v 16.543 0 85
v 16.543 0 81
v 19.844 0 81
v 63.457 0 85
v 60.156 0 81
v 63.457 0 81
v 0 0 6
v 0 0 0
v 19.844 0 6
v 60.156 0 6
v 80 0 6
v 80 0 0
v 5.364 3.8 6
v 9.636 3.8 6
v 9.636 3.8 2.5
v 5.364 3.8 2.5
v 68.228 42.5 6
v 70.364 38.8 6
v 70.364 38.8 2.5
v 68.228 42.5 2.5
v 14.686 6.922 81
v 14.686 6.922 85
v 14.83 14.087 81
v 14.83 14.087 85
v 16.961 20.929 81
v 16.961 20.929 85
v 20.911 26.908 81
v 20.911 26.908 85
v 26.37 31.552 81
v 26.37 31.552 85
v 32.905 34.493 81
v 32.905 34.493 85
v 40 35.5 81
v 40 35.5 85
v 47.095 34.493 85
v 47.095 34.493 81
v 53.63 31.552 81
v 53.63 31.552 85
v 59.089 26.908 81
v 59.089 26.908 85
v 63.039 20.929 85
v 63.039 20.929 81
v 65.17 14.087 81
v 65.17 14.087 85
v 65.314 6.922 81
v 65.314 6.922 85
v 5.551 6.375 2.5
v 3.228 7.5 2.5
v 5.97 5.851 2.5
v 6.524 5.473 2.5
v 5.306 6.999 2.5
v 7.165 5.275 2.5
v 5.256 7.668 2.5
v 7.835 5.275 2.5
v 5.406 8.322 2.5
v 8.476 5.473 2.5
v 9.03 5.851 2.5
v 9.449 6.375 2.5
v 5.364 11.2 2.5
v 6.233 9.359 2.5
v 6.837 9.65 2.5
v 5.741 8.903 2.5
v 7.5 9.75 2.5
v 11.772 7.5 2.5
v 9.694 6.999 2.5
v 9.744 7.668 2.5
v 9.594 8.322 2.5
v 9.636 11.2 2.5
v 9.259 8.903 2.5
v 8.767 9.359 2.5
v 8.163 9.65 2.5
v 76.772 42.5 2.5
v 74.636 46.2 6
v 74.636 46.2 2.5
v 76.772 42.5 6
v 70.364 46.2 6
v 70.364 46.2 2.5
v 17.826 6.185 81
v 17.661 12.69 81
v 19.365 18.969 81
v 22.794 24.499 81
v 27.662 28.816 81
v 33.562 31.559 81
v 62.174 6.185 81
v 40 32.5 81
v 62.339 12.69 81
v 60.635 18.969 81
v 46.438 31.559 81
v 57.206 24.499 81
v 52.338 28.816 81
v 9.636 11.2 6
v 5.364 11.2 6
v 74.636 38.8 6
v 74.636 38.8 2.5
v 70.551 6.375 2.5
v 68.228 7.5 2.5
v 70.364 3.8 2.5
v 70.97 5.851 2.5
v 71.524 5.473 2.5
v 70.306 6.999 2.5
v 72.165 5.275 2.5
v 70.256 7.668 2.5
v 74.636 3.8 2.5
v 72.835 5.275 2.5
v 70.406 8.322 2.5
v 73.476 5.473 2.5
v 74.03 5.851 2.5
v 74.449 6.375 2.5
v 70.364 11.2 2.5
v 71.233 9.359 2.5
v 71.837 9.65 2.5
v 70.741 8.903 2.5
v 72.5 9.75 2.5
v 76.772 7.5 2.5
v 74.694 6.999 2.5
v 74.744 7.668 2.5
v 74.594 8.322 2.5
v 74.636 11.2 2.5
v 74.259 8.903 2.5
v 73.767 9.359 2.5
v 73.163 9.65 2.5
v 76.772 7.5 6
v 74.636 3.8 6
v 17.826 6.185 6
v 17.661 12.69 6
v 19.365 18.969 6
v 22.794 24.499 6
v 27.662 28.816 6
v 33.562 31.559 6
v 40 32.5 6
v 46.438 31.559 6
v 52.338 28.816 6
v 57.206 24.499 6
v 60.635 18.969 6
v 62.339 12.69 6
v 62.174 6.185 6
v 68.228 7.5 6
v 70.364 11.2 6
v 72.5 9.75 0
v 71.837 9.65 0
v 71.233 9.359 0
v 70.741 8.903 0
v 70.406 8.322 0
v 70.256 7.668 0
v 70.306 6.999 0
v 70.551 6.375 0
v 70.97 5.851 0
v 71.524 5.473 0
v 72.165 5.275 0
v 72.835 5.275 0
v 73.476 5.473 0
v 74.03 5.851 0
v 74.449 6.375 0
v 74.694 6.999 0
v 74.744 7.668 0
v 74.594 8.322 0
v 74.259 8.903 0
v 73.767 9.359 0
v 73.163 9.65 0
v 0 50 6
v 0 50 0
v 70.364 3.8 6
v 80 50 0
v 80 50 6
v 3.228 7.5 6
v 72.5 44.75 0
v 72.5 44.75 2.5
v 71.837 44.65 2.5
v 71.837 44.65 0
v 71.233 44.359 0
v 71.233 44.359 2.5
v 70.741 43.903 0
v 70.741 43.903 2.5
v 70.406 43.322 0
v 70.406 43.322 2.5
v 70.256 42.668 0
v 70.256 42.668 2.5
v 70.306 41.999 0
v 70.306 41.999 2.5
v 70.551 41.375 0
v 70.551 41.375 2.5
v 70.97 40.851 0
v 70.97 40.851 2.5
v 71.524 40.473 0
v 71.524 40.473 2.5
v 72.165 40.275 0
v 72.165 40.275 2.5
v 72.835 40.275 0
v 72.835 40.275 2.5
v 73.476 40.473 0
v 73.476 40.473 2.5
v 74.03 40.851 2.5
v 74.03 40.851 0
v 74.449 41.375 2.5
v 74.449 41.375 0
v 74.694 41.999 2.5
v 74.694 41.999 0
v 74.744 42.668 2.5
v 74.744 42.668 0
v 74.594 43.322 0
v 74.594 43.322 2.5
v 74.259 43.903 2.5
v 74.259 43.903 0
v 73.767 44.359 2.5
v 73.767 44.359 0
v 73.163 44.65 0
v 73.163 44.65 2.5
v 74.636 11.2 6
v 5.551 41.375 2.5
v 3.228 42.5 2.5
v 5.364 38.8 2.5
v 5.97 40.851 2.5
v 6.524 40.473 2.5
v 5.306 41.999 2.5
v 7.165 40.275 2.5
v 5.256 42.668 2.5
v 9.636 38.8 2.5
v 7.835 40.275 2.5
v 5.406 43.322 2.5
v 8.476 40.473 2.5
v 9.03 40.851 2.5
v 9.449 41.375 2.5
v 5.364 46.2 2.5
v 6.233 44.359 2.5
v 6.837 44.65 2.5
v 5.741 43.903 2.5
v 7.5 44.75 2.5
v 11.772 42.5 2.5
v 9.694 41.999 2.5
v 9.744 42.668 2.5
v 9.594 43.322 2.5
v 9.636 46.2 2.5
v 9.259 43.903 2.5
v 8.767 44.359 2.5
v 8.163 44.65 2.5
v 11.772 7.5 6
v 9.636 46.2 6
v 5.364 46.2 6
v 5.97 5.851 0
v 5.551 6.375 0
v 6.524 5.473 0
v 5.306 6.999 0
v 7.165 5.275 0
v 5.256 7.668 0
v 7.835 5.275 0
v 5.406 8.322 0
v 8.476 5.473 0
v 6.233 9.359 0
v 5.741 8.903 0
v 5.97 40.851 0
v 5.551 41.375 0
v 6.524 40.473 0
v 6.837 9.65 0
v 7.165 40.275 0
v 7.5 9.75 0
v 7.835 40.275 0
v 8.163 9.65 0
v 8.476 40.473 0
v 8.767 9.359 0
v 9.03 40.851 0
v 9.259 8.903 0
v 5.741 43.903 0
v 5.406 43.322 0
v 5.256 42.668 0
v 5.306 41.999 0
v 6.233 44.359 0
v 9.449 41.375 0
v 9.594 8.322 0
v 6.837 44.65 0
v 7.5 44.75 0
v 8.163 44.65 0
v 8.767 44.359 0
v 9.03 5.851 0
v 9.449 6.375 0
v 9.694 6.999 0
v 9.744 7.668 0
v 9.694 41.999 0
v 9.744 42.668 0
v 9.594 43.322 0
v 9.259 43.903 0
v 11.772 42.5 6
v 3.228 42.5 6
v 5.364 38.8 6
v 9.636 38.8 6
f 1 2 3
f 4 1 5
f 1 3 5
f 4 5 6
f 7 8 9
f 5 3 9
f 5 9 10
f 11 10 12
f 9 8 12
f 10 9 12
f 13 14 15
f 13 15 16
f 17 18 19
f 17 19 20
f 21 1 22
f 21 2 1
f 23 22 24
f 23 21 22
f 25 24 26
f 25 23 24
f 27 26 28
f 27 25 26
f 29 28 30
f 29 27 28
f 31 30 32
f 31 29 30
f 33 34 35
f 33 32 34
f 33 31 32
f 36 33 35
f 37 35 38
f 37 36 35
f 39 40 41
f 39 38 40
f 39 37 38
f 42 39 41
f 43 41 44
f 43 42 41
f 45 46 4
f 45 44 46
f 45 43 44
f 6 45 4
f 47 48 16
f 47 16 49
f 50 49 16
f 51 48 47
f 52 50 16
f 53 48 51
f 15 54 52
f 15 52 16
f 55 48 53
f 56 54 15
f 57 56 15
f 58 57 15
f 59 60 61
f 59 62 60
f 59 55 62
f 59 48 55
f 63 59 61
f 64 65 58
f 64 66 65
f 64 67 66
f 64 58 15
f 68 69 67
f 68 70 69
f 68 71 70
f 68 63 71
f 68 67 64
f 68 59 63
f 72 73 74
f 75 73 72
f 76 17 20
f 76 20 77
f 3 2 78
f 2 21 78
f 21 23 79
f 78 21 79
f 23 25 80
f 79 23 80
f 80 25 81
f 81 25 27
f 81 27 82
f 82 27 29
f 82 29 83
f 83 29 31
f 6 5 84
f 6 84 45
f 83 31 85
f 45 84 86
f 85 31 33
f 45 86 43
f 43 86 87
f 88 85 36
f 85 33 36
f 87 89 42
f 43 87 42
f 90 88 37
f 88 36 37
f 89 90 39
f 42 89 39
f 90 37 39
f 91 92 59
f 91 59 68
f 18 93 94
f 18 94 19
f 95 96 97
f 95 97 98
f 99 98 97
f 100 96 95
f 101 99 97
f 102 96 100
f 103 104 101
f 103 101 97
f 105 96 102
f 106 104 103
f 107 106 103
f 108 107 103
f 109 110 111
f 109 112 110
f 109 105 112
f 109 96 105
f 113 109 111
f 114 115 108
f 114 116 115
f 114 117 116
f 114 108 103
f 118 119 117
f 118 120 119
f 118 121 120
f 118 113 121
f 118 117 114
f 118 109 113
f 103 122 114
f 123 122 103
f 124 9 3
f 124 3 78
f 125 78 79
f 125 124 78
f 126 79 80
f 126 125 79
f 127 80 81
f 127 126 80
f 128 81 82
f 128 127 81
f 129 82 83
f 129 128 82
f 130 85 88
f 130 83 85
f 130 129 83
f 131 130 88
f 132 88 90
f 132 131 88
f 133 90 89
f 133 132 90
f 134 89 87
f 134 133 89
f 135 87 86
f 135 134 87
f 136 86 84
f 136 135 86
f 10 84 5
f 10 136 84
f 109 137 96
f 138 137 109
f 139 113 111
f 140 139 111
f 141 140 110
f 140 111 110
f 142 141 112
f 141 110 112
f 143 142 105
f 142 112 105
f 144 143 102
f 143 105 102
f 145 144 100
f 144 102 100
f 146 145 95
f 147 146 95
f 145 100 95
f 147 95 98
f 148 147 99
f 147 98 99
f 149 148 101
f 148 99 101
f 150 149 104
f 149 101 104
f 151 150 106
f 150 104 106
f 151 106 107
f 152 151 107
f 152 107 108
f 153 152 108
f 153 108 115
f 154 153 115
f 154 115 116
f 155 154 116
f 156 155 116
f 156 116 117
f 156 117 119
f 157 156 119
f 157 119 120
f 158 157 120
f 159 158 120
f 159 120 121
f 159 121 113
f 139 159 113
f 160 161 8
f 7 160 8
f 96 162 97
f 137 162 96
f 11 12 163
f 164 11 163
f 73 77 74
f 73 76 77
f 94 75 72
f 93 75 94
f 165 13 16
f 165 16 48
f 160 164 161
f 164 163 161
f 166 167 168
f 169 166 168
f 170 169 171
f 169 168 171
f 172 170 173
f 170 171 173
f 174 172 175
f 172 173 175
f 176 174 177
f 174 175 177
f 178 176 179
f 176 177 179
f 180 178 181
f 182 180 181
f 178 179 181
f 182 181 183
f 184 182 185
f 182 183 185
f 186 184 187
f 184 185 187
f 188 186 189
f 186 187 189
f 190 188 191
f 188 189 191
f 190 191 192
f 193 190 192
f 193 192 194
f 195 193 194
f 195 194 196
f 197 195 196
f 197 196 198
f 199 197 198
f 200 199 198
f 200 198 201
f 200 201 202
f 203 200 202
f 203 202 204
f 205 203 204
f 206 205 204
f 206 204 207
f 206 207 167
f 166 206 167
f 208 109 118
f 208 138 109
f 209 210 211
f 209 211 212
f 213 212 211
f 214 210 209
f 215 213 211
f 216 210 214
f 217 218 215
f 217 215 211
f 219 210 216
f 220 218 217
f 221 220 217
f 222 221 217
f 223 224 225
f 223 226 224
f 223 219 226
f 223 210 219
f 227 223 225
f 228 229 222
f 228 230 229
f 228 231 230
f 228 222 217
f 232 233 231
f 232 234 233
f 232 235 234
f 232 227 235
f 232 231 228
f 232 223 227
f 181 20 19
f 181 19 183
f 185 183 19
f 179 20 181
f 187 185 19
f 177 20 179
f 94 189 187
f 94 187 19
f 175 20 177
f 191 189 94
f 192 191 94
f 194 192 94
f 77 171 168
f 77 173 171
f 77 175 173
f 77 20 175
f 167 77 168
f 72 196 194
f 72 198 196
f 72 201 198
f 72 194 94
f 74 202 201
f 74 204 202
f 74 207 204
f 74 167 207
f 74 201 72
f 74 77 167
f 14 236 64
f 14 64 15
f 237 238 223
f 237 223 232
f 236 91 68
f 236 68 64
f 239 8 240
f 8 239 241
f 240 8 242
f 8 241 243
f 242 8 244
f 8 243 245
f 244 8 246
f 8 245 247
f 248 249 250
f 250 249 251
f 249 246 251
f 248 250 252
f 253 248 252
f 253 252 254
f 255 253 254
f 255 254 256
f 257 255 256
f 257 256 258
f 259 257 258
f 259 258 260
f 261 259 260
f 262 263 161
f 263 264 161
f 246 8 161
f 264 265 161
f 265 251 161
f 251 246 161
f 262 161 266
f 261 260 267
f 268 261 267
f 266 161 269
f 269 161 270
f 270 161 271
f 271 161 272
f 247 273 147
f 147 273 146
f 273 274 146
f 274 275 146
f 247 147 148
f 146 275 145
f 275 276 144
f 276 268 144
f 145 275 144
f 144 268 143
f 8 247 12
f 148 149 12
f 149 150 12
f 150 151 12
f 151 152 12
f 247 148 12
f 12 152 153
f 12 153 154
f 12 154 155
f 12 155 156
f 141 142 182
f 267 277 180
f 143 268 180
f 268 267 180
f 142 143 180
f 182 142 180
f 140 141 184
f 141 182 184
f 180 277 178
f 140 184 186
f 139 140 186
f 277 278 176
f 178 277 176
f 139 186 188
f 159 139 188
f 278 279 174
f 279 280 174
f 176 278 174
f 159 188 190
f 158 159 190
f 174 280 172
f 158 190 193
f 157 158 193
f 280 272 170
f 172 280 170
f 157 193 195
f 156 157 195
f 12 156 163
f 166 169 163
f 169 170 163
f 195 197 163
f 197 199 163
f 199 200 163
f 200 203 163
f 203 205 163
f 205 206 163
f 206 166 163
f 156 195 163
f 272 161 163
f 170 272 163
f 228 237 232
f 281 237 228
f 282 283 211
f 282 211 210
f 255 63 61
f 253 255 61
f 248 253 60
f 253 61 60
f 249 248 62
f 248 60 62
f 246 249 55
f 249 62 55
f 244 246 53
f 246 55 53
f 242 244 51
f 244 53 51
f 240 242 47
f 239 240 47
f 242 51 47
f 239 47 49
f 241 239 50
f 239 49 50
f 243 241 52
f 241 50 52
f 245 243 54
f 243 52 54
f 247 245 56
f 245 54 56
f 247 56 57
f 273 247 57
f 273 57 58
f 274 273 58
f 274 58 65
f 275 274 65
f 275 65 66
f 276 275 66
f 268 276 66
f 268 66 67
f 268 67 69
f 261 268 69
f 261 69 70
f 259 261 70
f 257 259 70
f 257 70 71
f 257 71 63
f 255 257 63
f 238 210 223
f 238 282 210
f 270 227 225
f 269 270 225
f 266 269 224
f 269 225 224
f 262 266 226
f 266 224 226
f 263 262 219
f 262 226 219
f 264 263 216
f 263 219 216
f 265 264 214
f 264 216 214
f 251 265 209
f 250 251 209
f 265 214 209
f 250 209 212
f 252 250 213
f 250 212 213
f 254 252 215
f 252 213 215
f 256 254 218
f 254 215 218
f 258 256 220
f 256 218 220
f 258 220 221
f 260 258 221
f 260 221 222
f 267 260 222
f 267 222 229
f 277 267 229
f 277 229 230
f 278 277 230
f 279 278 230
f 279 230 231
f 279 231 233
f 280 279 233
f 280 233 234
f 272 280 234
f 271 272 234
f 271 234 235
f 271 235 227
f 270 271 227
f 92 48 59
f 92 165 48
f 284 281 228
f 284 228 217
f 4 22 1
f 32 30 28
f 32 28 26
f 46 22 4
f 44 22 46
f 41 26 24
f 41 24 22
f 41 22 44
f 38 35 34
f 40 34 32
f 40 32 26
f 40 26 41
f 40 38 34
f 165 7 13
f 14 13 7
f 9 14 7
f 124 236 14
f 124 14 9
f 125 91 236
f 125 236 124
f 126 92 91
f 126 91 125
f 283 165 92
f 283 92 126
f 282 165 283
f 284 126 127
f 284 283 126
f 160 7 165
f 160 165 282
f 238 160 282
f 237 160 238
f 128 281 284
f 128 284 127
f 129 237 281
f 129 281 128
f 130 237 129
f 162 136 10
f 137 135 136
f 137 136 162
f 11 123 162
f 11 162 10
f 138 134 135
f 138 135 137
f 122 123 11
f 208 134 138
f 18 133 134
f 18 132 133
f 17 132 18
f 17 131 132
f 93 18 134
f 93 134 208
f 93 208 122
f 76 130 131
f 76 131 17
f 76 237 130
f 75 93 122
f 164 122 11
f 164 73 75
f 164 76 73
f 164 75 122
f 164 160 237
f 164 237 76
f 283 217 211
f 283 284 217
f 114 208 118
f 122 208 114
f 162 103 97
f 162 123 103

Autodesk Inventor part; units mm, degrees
ref_plane "Work Plane1" through (0, 0, 26) normal (0, 0, 1) x (1, 0, 0)
ref_plane "Work Plane2" through (0, 0, 61) normal (0, 0, 1) x (1, 0, 0)
ref_plane "YZ Plane" through (0, 0, 0) normal (1, 0, 0) x (0, 1, 0)
sketch "Sketch1" plane through (0, 0, 0) normal (0, 0, 1) x (1, 0, 0)
  line L0 (0, 0) -> (80, 0)
  line L1 (80, 0) -> (80, 50)
  line L2 (80, 50) -> (0, 50)
  line L3 (0, 50) -> (0, 0)
  dimension "d0" = 80
  dimension "d1" = 50
extrude "Extrusion1" add sketch "Sketch1" along normal blind 6
sketch "Sketch2" plane through (0, 0, 6) normal (0, 0, 1) x (1, 0, 0)
  line L0 (80, 50) -> (0, 50) projected
  line L1 (0, 50) -> (0, 0) projected
  arc A0 (60.1556, 0) -> (19.8444, 0) centre (40, 10) ccw
  line L2 (19.8444, 0) -> (60.1556, 0)
  dimension "d11" = 45
  dimension "d12" = 40
  dimension "d13" = 40
  dimension "d14" = 10
extrude "Extrusion2" add sketch "Sketch2" along normal blind 75
sketch "Sketch8" plane through (0, 0, 81) normal (0, 0, 1) x (1, 0, 0)
  arc A0 (60.1556, 0) -> (19.8444, 0) centre (40, 10) ccw projected
  line L0 (19.8444, 0) -> (60.1556, 0) projected
  arc A1 (63.4574, 0) -> (16.5426, 0) centre (40, 10) ccw
  line L1 (19.8444, 0) -> (16.5426, 0)
  line L2 (60.1556, 0) -> (63.4574, 0)
  point P0 (0, 0)
  dimension "d30" = 51
extrude "Extrusion7" add sketch "Sketch8" along normal blind 4
sketch "Sketch9" plane through (0, 0, 0) normal (0, 0, -1) x (-1, 0, 0)
  line L0 (0, 0) -> (-80, 0) projected
  line L1 (-80, 0) -> (-80, 50) projected
  point P0 (-72.5, 42.5)
  point P1 (-72.5, 7.5)
  point P2 (-7.5, 42.5)
  point P3 (-7.5, 7.5)
  dimension "d33" = 65
  dimension "d34" = 35
  dimension "d35" = 7.5
  dimension "d36" = 7.5
hole "Hole1" at (72.5, 42.5, 0) at (72.5, 7.5, 0) at (7.5, 42.5, 0) at (7.5, 7.5, 0) direction (0, 0, 1) diameter 4.5 end through all
sketch "Sketch10" plane through (0, 0, 6) normal (0, 0, 1) x (1, 0, 0)
  circle A0 centre (7.5, 42.5) radius 2.25 projected
  circle A1 centre (72.5, 42.5) radius 2.25 projected
  circle A2 centre (72.5, 7.5) radius 2.25 projected
  circle A3 centre (7.5, 7.5) radius 2.25 projected
  line L0 (11.7724, 42.5) -> (9.6362, 38.8)
  line L1 (9.6362, 38.8) -> (5.3638, 38.8)
  line L2 (5.3638, 38.8) -> (3.2276, 42.5)
  line L3 (3.2276, 42.5) -> (5.3638, 46.2)
  line L4 (5.3638, 46.2) -> (9.6362, 46.2)
  line L5 (9.6362, 46.2) -> (11.7724, 42.5)
  line L6 (11.7724, 7.5) -> (9.6362, 3.8)
  line L7 (9.6362, 3.8) -> (5.3638, 3.8)
  line L8 (5.3638, 3.8) -> (3.2276, 7.5)
  line L9 (3.2276, 7.5) -> (5.3638, 11.2)
  line L10 (5.3638, 11.2) -> (9.6362, 11.2)
  line L11 (9.6362, 11.2) -> (11.7724, 7.5)
  line L12 (76.7724, 7.5) -> (74.6362, 3.8)
  line L13 (74.6362, 3.8) -> (70.3638, 3.8)
  line L14 (70.3638, 3.8) -> (68.2276, 7.5)
  line L15 (68.2276, 7.5) -> (70.3638, 11.2)
  line L16 (70.3638, 11.2) -> (74.6362, 11.2)
  line L17 (74.6362, 11.2) -> (76.7724, 7.5)
  line L18 (76.7724, 42.5) -> (74.6362, 38.8)
  line L19 (74.6362, 38.8) -> (70.3638, 38.8)
  line L20 (70.3638, 38.8) -> (68.2276, 42.5)
  line L21 (68.2276, 42.5) -> (70.3638, 46.2)
  line L22 (70.3638, 46.2) -> (74.6362, 46.2)
  line L23 (74.6362, 46.2) -> (76.7724, 42.5)
  dimension "d44" = 7.4
extrude "Extrusion8" cut sketch "Sketch10" against normal blind 3.5
sketch "Sketch4" plane through (0, 0, 26) normal (0, 0, 1) x (1, 0, 0)
  arc A0 (62.9129, 0) -> (17.0871, 0) centre (40, 10) ccw projected
  line L0 (17.0871, 0) -> (62.9129, 0) projected
  circle A1 centre (40, 24.5) radius 11 construction
  arc A2 (28, 24.5) -> (52, 24.5) centre (40, 24.5) ccw
  line L1 (28, 24.5) -> (28, 31.9317)
  line L2 (52, 24.5) -> (52, 31.9317)
  arc A3 (62.9129, 0) -> (17.0871, 0) centre (40, 10) ccw projected
  point P0 (0, 0)
  dimension "d15" = 22
  dimension "d16" = 14.5
  dimension "d17" = 24
sketch "Sketch5" plane through (0, 0, 61) normal (0, 0, 1) x (1, 0, 0)
  arc A0 (62.9129, 0) -> (17.0871, 0) centre (40, 10) ccw projected
  line L0 (17.0871, 0) -> (62.9129, 0) projected
  arc A1 (28, 24.5) -> (52, 24.5) centre (40, 24.5) ccw projected
  line L1 (52, 31.9317) -> (52, 24.5) projected
  arc A2 (52, 31.9317) -> (28, 31.9317) centre (40, 10) ccw projected
  line L2 (28, 24.5) -> (28, 31.9317) projected
  point P0 (0, 0)
sketch "Sketch6" plane through (0, 0, 26) normal (0, 0, 1) x (1, 0, 0)
  arc A0 (28, 24.5) -> (52, 24.5) centre (40, 24.5) ccw projected
  line L0 (52, 31.9317) -> (52, 24.5) projected
  arc A1 (52, 31.9317) -> (28, 31.9317) centre (40, 10) ccw projected
  line L1 (28, 24.5) -> (28, 31.9317) projected
  arc A2 (35.75, 24.5) -> (44.25, 24.5) centre (40, 24.5) ccw
  line L2 (35.75, 26.9) -> (35.75, 34.6361)
  arc A3 (52, 31.9317) -> (28, 31.9317) centre (40, 10) ccw projected
  line L3 (44.25, 26.9) -> (44.25, 34.6361)
  arc A4 (35.75, 24.5) -> (35.75, 26.9) centre (34.15, 25.7) ccw
  arc A5 (44.25, 26.9) -> (44.25, 24.5) centre (45.85, 25.7) ccw
  point P0 (0, 0)
  dimension "d23" = 8.5
  dimension "d24" = 2
  dimension "d25" = 1.6
sketch "Sketch7" plane through (0, 0, 61) normal (0, 0, 1) x (1, 0, 0)
  arc A0 (35.75, 24.5) -> (44.25, 24.5) centre (40, 24.5) ccw projected
  arc A1 (44.25, 26.9) -> (44.25, 24.5) centre (45.85, 25.7) ccw projected
  line L0 (44.25, 34.6361) -> (44.25, 26.9) projected
  arc A2 (44.25, 34.6361) -> (35.75, 34.6361) centre (40, 10) ccw projected
  line L1 (35.75, 26.9) -> (35.75, 34.6361) projected
  arc A3 (35.75, 24.5) -> (35.75, 26.9) centre (34.15, 25.7) ccw projected
  point P0 (0, 0)
properties part number "SpoolHolderSingle" material "ABS Plastic"
